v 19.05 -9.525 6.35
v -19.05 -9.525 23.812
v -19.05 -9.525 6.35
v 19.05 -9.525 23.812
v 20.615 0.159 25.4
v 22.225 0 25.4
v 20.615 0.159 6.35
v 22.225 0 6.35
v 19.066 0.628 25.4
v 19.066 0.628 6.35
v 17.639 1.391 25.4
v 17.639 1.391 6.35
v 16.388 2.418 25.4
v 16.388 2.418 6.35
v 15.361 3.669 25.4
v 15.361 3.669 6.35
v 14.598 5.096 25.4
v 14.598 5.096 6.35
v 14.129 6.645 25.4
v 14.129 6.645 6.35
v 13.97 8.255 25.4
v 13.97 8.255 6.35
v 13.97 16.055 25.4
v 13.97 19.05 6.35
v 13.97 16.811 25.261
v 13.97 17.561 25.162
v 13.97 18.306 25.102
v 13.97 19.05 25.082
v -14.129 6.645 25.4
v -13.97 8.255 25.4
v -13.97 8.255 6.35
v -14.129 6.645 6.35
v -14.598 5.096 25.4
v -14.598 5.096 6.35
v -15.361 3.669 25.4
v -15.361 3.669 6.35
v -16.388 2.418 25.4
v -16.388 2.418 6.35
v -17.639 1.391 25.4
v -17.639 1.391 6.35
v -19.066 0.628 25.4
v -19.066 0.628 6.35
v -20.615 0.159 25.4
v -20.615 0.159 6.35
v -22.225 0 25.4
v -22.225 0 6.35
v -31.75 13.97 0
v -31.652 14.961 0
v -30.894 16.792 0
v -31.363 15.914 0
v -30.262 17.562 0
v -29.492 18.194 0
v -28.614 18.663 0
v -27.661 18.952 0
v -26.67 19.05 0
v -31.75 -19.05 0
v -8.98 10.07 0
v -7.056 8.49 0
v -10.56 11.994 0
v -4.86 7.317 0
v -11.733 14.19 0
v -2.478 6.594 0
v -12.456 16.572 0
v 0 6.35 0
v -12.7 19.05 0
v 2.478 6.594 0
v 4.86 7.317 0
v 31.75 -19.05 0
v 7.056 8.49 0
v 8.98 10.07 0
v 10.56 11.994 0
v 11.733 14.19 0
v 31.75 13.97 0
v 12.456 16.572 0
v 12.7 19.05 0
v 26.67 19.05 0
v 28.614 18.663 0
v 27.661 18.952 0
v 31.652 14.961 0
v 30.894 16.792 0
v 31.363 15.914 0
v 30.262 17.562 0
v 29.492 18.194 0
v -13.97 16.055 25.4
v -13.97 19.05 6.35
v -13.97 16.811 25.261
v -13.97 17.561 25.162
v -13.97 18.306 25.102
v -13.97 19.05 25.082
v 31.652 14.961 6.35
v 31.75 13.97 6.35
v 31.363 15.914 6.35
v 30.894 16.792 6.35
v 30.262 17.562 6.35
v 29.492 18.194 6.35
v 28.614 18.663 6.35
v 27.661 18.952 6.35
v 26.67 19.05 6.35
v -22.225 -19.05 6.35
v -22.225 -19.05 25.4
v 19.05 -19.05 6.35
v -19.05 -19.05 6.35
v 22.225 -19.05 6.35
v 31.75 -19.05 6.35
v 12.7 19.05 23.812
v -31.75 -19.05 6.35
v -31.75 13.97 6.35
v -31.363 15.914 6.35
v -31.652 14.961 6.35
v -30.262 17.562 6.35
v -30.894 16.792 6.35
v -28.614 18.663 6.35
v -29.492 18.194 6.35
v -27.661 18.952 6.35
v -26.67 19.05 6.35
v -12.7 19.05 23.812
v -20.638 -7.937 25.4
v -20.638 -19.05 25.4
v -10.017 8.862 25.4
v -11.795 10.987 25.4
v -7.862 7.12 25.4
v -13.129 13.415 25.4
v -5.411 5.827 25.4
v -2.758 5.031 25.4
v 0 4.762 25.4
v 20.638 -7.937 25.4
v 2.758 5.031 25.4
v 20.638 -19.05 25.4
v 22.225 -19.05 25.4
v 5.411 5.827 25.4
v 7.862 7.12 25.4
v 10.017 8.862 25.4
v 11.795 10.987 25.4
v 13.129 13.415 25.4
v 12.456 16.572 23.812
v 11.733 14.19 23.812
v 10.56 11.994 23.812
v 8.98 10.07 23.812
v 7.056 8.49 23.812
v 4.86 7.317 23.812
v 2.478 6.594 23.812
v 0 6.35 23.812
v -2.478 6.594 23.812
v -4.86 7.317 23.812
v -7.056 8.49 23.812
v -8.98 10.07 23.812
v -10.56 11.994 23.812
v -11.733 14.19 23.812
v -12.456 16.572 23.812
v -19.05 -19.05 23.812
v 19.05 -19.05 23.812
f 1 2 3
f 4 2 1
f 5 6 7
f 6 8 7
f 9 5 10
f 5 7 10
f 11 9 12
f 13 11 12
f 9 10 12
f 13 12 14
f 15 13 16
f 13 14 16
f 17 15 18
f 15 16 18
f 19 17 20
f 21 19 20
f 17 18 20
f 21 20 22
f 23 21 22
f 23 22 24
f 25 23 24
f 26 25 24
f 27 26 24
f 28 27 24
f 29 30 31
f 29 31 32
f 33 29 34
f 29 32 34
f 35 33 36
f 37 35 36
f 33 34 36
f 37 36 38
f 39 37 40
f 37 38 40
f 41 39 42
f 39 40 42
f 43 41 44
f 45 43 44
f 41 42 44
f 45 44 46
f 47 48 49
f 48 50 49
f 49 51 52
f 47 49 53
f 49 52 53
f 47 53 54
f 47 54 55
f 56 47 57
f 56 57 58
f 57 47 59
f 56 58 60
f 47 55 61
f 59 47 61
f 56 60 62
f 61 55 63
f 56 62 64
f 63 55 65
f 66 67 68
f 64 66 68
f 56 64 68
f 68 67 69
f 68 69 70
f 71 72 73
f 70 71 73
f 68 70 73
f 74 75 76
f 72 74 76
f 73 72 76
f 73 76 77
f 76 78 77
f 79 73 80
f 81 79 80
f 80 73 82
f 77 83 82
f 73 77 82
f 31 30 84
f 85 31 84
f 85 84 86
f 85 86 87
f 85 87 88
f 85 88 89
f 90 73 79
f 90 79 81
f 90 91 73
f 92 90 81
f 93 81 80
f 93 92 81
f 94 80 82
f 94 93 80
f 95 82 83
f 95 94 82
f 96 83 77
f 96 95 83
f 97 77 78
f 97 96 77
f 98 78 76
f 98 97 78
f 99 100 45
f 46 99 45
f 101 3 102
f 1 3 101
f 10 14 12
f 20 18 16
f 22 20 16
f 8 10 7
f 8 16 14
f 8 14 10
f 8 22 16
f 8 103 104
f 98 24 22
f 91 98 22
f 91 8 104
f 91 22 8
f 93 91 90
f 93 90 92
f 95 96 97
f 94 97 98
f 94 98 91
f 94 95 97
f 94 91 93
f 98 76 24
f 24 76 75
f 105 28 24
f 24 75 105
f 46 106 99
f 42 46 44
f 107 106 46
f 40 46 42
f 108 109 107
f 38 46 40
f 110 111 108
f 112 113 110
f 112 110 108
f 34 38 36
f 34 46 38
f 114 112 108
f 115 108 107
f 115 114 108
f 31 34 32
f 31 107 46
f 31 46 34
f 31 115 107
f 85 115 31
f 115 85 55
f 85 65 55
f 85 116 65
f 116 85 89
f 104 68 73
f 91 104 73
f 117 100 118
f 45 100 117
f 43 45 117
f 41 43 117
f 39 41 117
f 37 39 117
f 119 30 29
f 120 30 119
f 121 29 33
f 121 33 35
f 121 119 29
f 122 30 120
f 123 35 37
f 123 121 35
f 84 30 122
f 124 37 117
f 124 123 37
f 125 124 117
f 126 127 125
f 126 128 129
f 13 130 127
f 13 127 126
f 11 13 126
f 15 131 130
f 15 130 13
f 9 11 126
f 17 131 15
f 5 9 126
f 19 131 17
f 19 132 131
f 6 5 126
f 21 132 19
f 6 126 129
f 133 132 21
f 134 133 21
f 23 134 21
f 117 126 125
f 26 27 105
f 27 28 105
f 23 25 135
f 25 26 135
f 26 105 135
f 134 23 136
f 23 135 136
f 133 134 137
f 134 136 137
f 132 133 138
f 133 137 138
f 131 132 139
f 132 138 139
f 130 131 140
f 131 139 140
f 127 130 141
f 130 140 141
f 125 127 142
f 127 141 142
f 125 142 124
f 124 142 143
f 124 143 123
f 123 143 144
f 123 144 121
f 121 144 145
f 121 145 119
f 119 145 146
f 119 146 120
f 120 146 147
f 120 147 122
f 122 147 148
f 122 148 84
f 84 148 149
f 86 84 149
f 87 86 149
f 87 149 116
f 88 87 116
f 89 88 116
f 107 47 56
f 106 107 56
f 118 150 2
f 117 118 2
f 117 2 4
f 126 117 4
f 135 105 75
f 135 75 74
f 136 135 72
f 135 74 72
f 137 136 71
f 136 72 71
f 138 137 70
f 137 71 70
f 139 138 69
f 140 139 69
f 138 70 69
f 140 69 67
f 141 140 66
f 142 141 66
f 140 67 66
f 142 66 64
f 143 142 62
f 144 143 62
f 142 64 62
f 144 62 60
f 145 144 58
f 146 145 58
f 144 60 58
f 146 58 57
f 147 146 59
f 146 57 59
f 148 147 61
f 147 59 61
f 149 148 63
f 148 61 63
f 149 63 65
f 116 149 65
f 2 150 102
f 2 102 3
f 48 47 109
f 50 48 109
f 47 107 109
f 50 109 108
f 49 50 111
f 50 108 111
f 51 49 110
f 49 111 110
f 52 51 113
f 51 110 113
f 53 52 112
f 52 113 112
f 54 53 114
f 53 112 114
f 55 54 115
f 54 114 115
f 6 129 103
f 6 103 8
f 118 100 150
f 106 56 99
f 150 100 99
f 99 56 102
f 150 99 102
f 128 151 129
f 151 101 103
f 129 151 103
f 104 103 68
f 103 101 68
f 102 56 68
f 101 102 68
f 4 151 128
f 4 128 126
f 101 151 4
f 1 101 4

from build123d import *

# Parameters (mm, degrees)
F0_R      = 22.5780805595
F5_DEPTH  = 25.4
F6_W      = 9.525
F6_H      = 38.1
F7_DEPTH  = 19.05
F8_R      = 5.08
F9_W      = 9.525
F9_H      = 38.1
F10_DEPTH = 19.05
F11_W     = 38.1
F11_H     = 9.525
F12_DEPTH = 19.05
F14_R     = 5.08
F13_W     = 8.255
F13_H     = 19.05
F15_DEPTH = 19.05
F16_R     = 8.25499
F17_SIZE  = 1.5875


# Not quite as in the source:
# - a fillet or chamfer is up to 0.001 mm smaller than in the source, because OpenCascade refuses the exact size


with BuildPart() as f2:
    # F2: sweep along a path in F1
    with BuildLine(Plane.XZ) as f2_path:
        Line((0, 0), (57.7025674284, 65.8432990313))
    # F0 (on Top) → F2 (sweep)
    with BuildSketch(Plane.XY):
        with Locations((-2.6368375402, 0)):
            Circle(F0_R)
    sweep(path=f2_path.line)


with BuildPart() as f5:
    # F4 (on Top) → F5 (new body)
    with BuildSketch(Plane.XY):
        with BuildLine():
            Line((-31.75, -19.05), (31.75, -19.05))
            Line((31.75, -19.05), (31.75, 19.05))
            Line((31.75, 19.05), (12.7, 19.05))
            ThreePointArc((12.7, 19.05), (0, 6.35), (-12.7, 19.05))
            Line((-12.7, 19.05), (-31.75, 19.05))
            Line((-31.75, 19.05), (-31.75, -19.05))
        make_face()
    extrude(amount=F5_DEPTH)

    # F6 (on face) → F7 (cut)
    with BuildSketch(Plane.XY.offset(25.4)):
        with Locations((26.9875, 0)):
            Rectangle(F6_W, F6_H)
    extrude(amount=-F7_DEPTH, mode=Mode.SUBTRACT)

    # F8
    f8_edges = [f5.edges().sort_by_distance(p)[0] for p in [
        (31.75, 19.05, 3.175),
    ]]
    fillet(f8_edges, radius=F8_R)

    # F9 (on face) → F10 (cut)
    with BuildSketch(Plane.XY.offset(25.4)):
        with Locations((-26.9875, 0)):
            Rectangle(F9_W, F9_H)
    extrude(amount=-F10_DEPTH, mode=Mode.SUBTRACT)

    # F11 (on face) → F12 (cut)
    with BuildSketch(Plane.XY.offset(25.4)):
        with Locations((0, -14.2875)):
            Rectangle(F11_W, F11_H)
    extrude(amount=-F12_DEPTH, mode=Mode.SUBTRACT)

    # F14
    f14_edges = [f5.edges().sort_by_distance(p)[0] for p in [
        (-31.75, 19.05, 3.175),
    ]]
    fillet(f14_edges, radius=F14_R)

    # F13 (on face) → F15 (cut)
    with BuildSketch(Plane.XY.offset(25.4)):
        with Locations((-18.0975, 9.525)):
            Rectangle(F13_W, F13_H)
        with Locations((18.0975, 9.525)):
            Rectangle(F13_W, F13_H)
    extrude(amount=-F15_DEPTH, mode=Mode.SUBTRACT)

    # F16 (radius 8.255 in the source; OpenCascade refuses exactly that, so slightly less here)
    f16_edges = [f5.edges().sort_by_distance(p)[0] for p in [
        (-13.97, 0, 15.875),
        (13.97, 0, 15.875),
    ]]
    fillet(f16_edges, radius=F16_R)

    # F17
    f17_edges = [f5.edges().sort_by_distance(p)[0] for p in [
        (0, 6.35, 25.4),
        (0, -9.525, 25.4),
        (-19.05, -14.2875, 25.4),
        (19.05, -14.2875, 25.4),
    ]]
    chamfer(f17_edges, length=F17_SIZE)


solid = f5.part
